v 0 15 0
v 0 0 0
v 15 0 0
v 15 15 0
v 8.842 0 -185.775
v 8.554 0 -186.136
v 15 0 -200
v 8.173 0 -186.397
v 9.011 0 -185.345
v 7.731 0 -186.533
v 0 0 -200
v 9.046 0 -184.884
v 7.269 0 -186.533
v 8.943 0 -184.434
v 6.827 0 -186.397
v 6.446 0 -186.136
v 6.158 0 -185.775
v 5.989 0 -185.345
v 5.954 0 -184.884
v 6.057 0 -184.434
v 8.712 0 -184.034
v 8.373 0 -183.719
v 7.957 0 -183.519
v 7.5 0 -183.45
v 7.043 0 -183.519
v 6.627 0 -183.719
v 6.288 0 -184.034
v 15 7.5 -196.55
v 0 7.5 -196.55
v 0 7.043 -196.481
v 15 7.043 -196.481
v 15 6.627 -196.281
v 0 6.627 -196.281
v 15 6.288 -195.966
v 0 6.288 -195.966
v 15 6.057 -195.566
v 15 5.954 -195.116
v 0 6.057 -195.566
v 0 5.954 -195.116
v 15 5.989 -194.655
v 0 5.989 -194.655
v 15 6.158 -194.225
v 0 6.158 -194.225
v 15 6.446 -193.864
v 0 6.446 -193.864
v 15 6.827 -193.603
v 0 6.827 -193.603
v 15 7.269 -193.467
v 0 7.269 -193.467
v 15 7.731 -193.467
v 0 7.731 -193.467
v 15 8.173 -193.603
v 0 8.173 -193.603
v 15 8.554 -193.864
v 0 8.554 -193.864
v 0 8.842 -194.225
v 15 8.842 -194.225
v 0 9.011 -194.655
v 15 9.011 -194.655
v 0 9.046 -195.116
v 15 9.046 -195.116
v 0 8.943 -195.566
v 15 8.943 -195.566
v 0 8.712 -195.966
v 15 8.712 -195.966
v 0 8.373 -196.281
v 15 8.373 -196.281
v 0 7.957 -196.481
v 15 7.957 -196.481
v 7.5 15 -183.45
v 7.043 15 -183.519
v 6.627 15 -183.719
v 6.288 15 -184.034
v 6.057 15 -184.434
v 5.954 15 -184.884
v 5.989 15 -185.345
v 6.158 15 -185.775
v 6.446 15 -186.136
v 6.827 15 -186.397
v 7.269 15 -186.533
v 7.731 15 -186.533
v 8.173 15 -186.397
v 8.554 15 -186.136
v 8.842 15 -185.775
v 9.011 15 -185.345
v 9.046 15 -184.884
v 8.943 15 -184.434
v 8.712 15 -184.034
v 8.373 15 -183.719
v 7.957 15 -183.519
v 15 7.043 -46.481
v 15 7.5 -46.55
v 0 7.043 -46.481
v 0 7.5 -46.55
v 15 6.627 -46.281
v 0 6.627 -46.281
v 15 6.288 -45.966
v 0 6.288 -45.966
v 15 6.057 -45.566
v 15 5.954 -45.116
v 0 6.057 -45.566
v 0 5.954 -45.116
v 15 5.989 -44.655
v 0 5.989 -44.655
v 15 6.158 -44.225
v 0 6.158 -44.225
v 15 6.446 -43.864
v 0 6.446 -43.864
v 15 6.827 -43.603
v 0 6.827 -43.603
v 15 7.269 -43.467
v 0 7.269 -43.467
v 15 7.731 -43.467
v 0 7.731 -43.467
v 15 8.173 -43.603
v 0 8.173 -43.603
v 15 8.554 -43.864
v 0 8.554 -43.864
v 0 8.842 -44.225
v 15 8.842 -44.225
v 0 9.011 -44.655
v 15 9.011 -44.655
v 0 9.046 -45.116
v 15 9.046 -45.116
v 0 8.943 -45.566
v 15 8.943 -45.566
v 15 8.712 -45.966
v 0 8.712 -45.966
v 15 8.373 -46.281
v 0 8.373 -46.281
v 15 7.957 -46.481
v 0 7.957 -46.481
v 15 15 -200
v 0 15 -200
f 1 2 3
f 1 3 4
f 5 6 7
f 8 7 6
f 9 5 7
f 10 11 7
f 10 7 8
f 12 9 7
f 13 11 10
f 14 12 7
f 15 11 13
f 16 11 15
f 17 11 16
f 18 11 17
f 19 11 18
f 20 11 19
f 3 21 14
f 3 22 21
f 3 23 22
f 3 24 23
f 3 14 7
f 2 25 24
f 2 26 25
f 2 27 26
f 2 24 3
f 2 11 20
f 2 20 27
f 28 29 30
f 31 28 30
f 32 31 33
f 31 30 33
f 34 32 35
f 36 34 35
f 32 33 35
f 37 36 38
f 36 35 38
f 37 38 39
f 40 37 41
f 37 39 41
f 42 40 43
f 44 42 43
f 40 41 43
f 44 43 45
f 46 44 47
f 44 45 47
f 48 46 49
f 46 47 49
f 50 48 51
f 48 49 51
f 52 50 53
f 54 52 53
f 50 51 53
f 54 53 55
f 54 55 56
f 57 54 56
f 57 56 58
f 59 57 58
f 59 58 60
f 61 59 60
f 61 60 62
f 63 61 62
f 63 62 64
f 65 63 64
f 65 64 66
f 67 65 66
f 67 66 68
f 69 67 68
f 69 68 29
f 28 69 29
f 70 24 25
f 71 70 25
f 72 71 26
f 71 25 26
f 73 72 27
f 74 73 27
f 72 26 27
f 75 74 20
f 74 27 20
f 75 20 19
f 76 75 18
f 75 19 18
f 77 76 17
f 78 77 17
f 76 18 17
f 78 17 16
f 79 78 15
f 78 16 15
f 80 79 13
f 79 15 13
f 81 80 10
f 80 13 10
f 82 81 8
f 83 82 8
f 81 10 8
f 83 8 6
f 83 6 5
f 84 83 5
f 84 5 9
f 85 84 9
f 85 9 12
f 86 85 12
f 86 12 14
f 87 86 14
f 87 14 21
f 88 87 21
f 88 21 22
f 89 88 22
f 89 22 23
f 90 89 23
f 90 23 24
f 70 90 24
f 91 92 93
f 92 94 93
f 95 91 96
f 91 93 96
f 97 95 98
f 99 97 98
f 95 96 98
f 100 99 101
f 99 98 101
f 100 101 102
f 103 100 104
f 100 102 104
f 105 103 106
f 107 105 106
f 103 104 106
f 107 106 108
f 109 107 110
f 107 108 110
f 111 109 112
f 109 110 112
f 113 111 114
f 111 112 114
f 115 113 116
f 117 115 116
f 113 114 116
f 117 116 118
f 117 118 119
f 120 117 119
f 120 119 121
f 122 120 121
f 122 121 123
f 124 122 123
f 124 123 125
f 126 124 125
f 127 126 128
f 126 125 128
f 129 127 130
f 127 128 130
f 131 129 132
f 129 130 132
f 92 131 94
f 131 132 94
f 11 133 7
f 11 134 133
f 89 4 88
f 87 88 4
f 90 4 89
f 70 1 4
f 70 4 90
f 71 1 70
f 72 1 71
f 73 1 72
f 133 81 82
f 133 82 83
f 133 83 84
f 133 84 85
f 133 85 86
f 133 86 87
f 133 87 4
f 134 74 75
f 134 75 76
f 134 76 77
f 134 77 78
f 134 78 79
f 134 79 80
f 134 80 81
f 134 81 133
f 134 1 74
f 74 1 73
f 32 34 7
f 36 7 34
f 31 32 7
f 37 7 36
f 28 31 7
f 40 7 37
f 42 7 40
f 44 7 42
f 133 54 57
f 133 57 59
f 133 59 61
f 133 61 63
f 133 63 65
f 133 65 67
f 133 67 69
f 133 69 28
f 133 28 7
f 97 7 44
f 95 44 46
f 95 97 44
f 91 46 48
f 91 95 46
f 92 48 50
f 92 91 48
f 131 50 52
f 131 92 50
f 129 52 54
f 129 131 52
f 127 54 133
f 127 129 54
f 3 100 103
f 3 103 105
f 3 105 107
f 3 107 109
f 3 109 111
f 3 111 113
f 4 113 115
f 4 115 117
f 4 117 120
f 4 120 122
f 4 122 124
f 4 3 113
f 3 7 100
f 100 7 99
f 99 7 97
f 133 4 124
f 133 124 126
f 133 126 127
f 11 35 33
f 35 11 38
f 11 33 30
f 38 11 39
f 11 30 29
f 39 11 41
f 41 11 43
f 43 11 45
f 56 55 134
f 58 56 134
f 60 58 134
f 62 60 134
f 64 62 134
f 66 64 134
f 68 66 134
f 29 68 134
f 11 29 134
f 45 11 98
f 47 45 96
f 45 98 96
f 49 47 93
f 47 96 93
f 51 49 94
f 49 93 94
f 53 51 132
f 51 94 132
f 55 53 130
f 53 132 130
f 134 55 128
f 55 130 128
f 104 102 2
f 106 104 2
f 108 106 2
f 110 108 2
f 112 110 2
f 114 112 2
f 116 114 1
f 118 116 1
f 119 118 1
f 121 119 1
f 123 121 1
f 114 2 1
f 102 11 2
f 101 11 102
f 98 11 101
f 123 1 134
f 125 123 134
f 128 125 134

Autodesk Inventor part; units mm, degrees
ref_plane "YZ Plane" through (0, 0, 0) normal (1, 0, 0) x (0, 1, 0)
ref_plane "XZ Plane" through (0, 0, 0) normal (0, 1, 0) x (-1, 0, 0)
ref_plane "XY Plane" through (0, 0, 0) normal (0, 0, 1) x (1, 0, 0)
sketch "スケッチ1" plane through (0, 0, 0) normal (1, 0, 0) x (0, 1, 0)
  line L0 (0, 0) -> (15, 0)
  line L1 (15, 0) -> (15, -200)
  line L2 (15, -200) -> (0, -200)
  line L3 (0, -200) -> (0, 0)
  dimension "d0" = 15
  dimension "d1" = 200
extrude "押し出し1" add sketch "スケッチ1" along normal blind 15
sketch "スケッチ2" plane through (15, 0, 0) normal (1, 0, 0) x (0, 0, -1)
  line L0 (200, 0) -> (200, 15) projected
  line L1 (0, 15) -> (0, 0) projected
  point P0 (195, 7.5)
  point P1 (45, 7.5)
  point P2 (200, 7.5)
  point P3 (200, 7.5)
  point P4 (200, 7.5)
  point P5 (0, 7.5)
  dimension "d4" = 5
  dimension "d5" = 45
hole "穴1" at (15, 7.5, -195) at (15, 7.5, -45) direction (-1, 0, 0) diameter 3.1 end through all
sketch "スケッチ3" plane through (0, 15, 0) normal (0, 1, 0) x (1, 0, 0)
  line L0 (0, 200) -> (15, 200) projected
  point P0 (0, 0)
  point P1 (7.5, 185)
  point P2 (7.5, 200)
  point P3 (7.5, 200)
  dimension "d13" = 15
hole "穴2" at (7.5, 15, -185) direction (0, -1, 0) diameter 3.1 end through all
properties part number "Dai"
